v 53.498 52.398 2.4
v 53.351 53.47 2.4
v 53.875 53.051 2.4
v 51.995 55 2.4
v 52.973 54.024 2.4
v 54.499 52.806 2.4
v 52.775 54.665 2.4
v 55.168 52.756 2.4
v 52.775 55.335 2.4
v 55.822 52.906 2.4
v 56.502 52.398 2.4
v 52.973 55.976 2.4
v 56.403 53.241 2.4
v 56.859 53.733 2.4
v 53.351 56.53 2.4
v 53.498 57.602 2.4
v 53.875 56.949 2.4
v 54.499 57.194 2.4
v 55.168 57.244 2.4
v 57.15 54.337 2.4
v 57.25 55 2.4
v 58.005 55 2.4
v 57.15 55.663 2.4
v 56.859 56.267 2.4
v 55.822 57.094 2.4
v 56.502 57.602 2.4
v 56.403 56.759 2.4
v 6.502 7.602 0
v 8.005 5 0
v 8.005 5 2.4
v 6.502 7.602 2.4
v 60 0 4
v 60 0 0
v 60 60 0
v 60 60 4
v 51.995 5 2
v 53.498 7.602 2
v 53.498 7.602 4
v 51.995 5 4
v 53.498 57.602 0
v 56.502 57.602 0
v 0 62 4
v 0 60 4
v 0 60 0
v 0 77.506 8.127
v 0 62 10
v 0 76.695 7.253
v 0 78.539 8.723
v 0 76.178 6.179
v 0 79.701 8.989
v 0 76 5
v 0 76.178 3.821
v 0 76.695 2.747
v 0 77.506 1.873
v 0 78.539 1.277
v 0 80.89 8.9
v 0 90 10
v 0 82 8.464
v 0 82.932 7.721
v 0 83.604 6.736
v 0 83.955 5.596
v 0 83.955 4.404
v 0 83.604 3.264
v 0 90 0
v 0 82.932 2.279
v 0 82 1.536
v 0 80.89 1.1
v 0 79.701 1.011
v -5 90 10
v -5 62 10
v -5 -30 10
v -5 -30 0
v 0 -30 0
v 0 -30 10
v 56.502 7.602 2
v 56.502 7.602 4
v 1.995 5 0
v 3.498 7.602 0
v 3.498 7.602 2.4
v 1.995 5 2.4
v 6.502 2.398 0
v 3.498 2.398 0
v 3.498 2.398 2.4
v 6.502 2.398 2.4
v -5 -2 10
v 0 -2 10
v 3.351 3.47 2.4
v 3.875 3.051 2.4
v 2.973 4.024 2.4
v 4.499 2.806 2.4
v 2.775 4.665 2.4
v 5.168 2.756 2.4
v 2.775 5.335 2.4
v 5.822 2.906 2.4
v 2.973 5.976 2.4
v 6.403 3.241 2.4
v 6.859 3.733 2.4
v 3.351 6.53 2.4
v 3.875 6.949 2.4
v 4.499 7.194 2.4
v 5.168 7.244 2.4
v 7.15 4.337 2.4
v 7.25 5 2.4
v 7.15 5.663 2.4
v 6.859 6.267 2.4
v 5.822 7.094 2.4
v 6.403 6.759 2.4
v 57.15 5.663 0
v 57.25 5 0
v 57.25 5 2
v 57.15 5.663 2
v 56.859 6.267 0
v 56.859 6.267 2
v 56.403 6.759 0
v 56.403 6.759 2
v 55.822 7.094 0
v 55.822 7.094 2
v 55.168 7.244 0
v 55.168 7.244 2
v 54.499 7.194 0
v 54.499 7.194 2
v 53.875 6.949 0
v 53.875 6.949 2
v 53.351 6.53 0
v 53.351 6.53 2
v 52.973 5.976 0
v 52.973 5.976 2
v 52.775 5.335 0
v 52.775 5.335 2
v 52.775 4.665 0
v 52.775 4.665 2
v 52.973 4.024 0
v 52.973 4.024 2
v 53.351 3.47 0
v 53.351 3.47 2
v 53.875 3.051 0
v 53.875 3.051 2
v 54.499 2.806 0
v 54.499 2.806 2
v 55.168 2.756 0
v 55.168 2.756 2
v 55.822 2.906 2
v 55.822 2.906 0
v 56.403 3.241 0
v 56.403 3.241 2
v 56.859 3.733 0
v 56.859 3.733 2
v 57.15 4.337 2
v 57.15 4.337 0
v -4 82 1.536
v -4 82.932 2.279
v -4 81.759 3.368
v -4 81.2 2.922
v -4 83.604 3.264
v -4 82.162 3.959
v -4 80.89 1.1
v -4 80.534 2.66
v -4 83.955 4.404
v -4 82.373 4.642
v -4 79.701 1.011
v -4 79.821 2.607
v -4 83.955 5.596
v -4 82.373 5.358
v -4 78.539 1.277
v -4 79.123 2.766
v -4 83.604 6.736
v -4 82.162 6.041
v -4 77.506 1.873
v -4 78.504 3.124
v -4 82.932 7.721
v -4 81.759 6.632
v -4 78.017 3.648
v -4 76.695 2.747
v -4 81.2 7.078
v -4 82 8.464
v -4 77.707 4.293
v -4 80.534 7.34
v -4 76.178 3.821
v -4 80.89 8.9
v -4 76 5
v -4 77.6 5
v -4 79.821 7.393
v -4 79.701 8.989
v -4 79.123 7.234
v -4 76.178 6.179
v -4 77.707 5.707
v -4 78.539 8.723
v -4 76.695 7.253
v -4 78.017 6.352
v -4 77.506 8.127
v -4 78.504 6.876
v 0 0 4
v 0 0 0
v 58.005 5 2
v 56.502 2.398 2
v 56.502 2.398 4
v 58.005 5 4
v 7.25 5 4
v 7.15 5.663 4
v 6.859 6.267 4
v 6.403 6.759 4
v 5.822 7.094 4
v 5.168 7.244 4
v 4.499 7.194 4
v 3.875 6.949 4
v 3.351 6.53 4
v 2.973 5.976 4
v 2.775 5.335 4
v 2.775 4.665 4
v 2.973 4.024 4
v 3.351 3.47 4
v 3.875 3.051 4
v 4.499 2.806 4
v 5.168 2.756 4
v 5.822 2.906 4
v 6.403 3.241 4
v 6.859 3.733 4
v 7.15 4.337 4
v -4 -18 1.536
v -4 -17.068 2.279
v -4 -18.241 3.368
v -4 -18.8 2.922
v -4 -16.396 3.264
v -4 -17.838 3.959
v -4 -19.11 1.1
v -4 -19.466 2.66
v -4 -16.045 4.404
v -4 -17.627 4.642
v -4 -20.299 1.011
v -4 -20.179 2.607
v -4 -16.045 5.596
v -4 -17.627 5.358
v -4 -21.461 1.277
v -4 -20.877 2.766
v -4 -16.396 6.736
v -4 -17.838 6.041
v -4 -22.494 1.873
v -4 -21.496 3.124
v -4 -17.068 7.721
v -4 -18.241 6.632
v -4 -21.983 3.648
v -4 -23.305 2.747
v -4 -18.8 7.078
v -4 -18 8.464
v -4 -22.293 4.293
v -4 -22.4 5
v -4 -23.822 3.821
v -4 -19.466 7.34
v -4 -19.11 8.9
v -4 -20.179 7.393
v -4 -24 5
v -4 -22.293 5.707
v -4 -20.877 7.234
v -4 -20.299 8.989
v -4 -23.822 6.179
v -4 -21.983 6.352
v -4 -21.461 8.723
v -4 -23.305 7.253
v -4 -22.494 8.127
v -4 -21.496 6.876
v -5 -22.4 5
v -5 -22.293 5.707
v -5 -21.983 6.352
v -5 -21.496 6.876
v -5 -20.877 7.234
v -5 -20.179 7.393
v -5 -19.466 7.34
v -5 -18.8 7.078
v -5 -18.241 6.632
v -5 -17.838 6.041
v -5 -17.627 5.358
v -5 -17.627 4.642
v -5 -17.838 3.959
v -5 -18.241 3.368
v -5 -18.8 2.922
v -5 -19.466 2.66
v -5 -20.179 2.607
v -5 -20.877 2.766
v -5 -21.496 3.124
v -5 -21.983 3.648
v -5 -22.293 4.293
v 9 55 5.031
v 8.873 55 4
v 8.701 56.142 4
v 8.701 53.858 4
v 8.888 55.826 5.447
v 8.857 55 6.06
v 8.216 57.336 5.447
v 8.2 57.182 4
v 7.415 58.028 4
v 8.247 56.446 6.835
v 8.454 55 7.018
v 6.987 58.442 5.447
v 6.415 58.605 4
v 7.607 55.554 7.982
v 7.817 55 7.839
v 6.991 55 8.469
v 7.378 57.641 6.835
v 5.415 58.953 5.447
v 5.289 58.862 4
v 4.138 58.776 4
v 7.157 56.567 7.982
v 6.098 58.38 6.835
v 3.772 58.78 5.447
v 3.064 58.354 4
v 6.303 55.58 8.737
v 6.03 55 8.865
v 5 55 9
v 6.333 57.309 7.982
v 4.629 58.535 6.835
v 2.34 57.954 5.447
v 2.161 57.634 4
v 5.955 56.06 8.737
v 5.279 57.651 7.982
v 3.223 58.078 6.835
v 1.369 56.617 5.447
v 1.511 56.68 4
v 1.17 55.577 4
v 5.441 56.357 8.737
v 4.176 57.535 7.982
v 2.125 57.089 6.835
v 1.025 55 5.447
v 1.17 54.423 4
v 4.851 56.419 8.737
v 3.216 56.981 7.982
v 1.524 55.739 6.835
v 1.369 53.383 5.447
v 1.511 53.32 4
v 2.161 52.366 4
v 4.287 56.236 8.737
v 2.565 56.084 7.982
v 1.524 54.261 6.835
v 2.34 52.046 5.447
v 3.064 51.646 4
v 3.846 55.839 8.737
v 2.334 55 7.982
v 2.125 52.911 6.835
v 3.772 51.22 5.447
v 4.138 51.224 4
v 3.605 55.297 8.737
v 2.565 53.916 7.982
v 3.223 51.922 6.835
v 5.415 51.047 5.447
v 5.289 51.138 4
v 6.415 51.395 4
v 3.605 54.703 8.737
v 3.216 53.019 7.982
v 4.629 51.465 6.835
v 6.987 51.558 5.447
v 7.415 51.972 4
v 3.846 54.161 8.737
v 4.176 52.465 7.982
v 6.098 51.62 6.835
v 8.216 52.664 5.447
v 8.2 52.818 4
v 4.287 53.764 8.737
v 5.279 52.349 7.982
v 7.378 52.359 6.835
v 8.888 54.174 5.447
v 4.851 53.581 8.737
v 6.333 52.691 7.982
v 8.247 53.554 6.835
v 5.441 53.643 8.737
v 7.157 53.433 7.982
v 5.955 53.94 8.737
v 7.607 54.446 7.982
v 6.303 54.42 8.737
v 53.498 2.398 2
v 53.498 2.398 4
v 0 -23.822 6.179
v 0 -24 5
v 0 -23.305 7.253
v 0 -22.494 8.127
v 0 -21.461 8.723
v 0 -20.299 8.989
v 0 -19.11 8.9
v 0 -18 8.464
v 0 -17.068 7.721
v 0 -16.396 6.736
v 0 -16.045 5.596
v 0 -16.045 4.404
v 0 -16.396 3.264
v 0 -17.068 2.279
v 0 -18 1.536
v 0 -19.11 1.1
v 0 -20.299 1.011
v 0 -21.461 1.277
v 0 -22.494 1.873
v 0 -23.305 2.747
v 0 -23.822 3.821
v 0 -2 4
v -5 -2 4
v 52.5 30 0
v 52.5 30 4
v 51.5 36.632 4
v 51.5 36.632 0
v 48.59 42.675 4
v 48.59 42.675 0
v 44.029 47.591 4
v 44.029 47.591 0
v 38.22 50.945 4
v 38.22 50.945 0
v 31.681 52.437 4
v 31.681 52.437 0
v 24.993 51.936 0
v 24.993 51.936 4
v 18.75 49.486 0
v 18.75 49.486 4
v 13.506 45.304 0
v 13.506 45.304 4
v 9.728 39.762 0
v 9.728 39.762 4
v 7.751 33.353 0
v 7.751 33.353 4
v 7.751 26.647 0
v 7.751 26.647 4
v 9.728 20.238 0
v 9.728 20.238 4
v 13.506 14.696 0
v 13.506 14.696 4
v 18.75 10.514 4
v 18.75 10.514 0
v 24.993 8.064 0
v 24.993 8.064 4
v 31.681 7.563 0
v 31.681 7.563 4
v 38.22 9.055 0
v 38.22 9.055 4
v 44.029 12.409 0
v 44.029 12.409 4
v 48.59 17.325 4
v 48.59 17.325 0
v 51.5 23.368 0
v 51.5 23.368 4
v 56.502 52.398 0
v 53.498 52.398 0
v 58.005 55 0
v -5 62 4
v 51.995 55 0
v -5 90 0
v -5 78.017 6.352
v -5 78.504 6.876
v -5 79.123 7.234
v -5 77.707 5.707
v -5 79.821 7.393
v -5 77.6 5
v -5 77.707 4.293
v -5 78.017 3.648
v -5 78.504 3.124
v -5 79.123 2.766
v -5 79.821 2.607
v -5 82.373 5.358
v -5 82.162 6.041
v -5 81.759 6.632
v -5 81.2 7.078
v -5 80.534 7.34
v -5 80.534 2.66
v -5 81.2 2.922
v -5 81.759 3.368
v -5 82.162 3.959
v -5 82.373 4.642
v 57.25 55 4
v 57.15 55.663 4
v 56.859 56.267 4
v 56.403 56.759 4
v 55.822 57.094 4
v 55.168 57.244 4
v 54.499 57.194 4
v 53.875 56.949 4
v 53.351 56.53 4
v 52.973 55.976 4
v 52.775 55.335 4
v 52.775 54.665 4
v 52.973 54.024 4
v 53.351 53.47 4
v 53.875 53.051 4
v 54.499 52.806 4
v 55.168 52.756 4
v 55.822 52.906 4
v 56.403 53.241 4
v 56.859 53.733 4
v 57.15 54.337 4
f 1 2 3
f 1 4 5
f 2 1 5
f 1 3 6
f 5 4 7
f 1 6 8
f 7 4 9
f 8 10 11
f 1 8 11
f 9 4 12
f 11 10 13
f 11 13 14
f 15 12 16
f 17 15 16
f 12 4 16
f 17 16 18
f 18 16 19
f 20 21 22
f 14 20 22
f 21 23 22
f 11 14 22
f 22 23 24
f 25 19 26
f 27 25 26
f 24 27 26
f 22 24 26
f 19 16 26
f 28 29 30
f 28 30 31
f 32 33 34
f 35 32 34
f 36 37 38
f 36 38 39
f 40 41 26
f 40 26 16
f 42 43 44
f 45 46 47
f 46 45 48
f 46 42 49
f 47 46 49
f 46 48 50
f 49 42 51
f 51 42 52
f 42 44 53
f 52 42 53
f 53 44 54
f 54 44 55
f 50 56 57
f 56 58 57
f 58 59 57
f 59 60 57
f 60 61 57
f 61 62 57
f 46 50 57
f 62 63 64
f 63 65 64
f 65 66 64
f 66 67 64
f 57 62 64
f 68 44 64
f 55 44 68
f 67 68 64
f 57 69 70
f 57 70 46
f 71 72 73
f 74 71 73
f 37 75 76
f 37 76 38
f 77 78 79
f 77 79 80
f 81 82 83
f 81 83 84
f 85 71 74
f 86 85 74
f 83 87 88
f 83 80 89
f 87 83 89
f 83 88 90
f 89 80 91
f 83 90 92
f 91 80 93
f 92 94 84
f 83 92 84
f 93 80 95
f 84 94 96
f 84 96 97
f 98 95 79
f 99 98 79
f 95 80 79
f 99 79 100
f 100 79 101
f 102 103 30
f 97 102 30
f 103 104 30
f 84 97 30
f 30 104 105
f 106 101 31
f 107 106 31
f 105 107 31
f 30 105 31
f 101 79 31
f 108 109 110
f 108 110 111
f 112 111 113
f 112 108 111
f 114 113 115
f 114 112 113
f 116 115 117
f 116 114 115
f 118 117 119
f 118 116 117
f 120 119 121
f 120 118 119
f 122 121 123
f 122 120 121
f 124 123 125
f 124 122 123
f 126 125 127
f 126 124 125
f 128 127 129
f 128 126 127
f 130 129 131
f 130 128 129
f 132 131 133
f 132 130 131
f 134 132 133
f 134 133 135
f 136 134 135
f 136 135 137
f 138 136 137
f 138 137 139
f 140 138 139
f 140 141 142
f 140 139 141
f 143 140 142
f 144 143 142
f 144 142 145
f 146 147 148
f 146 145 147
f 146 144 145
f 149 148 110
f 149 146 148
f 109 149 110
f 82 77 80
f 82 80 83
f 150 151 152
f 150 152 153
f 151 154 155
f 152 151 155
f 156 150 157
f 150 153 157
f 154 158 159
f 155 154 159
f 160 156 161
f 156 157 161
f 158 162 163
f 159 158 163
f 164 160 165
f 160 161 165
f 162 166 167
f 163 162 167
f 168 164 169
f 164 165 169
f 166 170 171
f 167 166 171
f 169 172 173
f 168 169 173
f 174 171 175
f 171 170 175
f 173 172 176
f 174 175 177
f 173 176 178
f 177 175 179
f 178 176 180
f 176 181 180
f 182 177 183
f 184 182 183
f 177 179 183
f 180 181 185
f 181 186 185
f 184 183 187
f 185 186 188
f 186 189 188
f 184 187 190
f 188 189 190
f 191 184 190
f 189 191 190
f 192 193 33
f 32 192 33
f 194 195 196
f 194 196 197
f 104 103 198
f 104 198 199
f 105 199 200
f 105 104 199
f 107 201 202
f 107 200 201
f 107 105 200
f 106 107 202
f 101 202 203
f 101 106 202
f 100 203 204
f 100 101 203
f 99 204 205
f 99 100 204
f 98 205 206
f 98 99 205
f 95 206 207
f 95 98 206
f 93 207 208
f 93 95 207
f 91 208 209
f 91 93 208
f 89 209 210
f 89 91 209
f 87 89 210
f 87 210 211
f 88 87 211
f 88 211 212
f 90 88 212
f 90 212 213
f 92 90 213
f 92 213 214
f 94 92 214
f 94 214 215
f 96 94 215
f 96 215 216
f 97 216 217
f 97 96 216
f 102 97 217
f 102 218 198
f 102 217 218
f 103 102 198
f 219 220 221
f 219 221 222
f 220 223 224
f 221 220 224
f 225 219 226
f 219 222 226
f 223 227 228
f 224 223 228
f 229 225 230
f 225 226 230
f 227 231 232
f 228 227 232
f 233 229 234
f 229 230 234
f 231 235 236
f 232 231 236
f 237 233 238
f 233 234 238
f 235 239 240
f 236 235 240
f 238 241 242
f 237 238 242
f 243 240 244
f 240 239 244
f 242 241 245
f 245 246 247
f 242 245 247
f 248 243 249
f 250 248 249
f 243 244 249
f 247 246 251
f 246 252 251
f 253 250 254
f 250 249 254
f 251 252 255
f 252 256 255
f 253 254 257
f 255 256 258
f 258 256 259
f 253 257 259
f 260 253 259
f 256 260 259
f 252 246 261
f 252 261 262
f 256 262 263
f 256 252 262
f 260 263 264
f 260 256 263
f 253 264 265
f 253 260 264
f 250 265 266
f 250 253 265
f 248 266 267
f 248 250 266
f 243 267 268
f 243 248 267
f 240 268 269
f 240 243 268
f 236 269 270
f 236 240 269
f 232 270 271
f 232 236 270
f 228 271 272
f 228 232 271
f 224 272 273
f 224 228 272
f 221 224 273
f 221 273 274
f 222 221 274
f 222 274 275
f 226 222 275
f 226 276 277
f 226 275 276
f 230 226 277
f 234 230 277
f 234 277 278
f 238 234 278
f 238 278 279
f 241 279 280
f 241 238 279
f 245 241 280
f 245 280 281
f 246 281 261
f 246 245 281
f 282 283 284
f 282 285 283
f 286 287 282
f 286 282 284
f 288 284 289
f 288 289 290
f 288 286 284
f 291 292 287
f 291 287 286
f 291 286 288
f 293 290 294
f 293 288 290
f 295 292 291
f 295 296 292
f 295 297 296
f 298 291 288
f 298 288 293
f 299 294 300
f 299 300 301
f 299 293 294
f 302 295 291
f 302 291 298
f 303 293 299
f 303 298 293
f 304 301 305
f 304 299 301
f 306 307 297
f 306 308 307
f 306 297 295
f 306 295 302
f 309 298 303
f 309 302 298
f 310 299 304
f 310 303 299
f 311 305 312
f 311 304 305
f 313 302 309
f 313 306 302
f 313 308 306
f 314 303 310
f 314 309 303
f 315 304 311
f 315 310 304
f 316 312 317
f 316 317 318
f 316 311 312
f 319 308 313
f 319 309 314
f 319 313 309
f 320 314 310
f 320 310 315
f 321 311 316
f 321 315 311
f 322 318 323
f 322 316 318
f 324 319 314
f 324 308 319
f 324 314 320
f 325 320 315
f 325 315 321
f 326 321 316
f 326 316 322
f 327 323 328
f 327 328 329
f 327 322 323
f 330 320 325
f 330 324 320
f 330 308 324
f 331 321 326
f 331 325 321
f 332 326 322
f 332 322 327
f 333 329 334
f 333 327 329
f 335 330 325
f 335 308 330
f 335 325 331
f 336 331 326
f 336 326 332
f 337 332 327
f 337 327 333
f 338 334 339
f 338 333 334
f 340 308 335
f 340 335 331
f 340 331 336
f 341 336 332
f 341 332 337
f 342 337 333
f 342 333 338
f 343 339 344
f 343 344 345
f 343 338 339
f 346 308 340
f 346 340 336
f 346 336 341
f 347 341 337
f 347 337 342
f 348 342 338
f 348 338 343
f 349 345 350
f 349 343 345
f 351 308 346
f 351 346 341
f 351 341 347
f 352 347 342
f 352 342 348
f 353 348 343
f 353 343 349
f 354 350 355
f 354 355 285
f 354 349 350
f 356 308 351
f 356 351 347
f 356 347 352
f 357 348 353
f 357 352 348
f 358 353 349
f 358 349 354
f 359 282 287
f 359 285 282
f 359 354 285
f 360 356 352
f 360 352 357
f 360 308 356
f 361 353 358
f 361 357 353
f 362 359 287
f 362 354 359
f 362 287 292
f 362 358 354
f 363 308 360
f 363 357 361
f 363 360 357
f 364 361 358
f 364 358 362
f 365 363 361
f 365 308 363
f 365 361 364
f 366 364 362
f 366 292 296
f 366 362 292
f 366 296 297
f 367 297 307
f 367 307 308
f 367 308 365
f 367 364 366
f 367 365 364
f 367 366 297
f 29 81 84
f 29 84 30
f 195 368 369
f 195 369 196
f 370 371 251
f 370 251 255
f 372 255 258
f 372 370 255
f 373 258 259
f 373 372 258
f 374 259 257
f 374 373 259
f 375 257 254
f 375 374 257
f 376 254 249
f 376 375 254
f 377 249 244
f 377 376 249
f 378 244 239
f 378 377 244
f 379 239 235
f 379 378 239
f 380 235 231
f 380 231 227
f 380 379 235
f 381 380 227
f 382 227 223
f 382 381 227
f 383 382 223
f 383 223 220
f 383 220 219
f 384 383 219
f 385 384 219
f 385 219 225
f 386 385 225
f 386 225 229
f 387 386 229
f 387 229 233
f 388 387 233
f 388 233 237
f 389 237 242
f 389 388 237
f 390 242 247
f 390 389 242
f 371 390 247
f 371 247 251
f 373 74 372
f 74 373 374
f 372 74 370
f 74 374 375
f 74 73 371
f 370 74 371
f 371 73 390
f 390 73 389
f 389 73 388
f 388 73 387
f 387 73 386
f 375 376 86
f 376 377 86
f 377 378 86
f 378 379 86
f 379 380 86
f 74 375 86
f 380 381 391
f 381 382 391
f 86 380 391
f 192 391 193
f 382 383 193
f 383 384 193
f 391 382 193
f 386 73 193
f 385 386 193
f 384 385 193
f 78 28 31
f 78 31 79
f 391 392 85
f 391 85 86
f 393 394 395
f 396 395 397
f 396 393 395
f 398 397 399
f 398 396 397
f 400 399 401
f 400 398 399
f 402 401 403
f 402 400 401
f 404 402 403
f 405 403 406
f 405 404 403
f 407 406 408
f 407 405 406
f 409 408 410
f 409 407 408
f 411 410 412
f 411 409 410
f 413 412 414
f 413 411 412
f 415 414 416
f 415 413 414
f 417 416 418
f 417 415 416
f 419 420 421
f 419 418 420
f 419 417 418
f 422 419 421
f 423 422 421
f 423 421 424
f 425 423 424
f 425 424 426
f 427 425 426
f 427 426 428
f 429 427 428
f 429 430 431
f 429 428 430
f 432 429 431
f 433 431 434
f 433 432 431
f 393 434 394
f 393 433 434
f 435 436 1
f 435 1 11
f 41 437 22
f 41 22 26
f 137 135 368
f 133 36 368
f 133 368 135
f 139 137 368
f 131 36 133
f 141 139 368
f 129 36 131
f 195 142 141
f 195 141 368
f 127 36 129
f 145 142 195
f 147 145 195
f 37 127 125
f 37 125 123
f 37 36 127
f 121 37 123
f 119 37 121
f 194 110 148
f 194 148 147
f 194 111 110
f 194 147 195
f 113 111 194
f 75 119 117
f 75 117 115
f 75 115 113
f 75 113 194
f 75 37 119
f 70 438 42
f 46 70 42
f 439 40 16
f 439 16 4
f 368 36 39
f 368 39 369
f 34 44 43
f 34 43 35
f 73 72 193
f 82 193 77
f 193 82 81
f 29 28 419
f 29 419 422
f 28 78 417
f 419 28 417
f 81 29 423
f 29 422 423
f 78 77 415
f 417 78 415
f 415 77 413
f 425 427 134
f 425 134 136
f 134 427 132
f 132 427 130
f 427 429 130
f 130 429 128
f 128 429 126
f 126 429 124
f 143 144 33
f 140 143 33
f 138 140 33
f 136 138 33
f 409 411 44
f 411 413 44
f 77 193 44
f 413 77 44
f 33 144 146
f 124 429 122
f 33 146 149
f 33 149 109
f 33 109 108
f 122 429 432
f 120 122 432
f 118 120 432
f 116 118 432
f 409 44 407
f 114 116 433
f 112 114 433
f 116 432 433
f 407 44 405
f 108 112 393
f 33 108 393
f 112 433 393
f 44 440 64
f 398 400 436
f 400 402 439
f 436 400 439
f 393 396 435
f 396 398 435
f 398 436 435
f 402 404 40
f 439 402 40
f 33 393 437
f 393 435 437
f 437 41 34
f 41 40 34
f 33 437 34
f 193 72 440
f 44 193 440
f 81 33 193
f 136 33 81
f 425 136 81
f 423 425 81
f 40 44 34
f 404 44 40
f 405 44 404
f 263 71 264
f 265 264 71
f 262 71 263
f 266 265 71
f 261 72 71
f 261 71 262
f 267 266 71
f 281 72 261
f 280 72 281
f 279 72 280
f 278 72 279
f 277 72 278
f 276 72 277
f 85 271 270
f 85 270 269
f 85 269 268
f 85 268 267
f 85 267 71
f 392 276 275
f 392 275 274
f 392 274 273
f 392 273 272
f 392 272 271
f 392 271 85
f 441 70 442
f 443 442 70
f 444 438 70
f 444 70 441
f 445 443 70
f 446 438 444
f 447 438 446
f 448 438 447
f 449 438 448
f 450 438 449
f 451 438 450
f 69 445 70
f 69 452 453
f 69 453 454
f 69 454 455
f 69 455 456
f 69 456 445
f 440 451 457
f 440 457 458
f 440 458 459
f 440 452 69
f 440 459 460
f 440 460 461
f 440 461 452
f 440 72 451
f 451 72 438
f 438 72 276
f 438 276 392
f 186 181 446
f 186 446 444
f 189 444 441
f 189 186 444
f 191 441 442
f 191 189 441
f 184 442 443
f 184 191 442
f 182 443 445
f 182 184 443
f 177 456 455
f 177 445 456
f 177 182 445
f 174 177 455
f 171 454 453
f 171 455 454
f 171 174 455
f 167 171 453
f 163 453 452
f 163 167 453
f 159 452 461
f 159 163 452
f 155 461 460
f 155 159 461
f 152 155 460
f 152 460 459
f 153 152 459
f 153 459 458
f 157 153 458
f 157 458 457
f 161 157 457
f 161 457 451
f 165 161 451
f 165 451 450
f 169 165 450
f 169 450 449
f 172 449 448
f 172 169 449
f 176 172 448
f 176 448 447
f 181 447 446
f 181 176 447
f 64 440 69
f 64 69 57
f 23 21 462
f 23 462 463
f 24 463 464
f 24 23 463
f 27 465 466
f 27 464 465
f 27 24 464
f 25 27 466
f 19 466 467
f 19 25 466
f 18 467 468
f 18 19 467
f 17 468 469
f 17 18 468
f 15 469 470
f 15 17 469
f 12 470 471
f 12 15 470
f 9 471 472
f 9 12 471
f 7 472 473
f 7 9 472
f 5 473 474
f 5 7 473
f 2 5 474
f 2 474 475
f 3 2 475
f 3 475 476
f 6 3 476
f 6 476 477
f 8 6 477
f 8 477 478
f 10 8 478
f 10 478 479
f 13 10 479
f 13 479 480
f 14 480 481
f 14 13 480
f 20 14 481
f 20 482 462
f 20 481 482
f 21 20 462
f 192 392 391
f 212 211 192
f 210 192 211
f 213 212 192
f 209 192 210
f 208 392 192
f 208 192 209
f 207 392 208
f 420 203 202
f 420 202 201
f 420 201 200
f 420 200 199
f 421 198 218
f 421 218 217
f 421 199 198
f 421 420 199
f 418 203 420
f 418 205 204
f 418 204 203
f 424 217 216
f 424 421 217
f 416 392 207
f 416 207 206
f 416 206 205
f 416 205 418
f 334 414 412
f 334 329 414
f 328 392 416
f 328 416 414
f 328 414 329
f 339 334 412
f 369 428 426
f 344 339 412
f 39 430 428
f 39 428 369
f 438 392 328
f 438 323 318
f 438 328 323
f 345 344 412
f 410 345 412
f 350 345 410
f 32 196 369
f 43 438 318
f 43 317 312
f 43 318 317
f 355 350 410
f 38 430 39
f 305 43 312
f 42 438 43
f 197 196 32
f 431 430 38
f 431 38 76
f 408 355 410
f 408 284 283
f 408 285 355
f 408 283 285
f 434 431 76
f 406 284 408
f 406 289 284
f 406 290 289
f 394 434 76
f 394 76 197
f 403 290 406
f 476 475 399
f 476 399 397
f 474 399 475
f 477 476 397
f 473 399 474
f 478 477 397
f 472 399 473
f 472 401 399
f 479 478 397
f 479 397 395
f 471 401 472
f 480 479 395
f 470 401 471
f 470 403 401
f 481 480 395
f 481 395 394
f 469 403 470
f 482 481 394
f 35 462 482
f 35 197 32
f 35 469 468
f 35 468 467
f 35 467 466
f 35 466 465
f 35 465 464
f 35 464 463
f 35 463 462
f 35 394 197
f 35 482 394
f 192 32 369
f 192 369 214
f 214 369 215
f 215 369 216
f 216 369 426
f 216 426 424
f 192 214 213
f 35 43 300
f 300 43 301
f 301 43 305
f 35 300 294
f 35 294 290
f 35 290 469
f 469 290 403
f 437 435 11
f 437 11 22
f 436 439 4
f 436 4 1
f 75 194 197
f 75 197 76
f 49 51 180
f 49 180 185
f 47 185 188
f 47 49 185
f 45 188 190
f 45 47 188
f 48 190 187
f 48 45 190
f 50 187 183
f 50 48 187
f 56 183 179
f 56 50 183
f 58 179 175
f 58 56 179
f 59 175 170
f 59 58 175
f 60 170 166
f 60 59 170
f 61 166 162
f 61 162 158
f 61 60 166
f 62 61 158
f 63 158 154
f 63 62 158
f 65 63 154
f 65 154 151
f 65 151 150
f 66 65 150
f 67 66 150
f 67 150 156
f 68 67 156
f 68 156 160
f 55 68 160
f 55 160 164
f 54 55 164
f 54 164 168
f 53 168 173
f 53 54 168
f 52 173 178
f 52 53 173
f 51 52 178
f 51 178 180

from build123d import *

# Parameters (mm, degrees)
CYLINDER014_R             = 4
CYLINDER014_DEPTH         = 4
CYLINDER015_R             = 2.4
CYLINDER015_DEPTH         = 10
FUSION014_PLACEMENT_ANGLE = 90
CYLINDER016_R             = 4
CYLINDER016_DEPTH         = 4
CYLINDER017_R             = 2.4
CYLINDER017_DEPTH         = 10
FUSION015_PLACEMENT_ANGLE = 90
FUSION016_PLACEMENT_ANGLE = 270
BOX003_W                  = 5
BOX003_H                  = 64
BOX003_DEPTH              = 6
BOX002_W                  = 5
BOX002_H                  = 120
BOX002_DEPTH              = 10
CYLINDER021_R             = 22.5
CYLINDER021_DEPTH         = 10
CYLINDER018_R             = 2.25
CYLINDER018_DEPTH         = 10
EXTRUDE_DEPTH             = 2.4
CYLINDER019_R             = 2.25
CYLINDER019_DEPTH         = 10
CYLINDER020_R             = 2.25
CYLINDER020_DEPTH         = 10
BOX004_W                  = 60
BOX004_H                  = 60
BOX004_DEPTH              = 4


with BuildPart() as cylinder014:
    # Cylinder014 → Cylinder014 (new body)
    with BuildSketch(Plane.XY):
        Circle(CYLINDER014_R)
    extrude(amount=CYLINDER014_DEPTH)


with BuildPart() as fusion014:
    # Cylinder015 → Cylinder015 (new body)
    with BuildSketch(Plane.XY):
        Circle(CYLINDER015_R)
    extrude(amount=CYLINDER015_DEPTH)

    # Fusion014: union Cylinder014
    add(cylinder014.part)


with BuildPart() as fusion014_1:
    # Fusion014 placement: moved
    add(fusion014.part.moved(Location((-50, 0, 5))).rotate(Axis((-50, 0, 5), (1, 0, 0)), FUSION014_PLACEMENT_ANGLE))


with BuildPart() as cylinder016:
    # Cylinder016 → Cylinder016 (new body)
    with BuildSketch(Plane.XY):
        Circle(CYLINDER016_R)
    extrude(amount=CYLINDER016_DEPTH)


with BuildPart() as fusion016:
    # Cylinder017 → Cylinder017 (new body)
    with BuildSketch(Plane.XY):
        Circle(CYLINDER017_R)
    extrude(amount=CYLINDER017_DEPTH)

    # Fusion015: union Cylinder016
    add(cylinder016.part)


with BuildPart() as fusion016_1:
    # Fusion015 placement: moved
    add(fusion016.part.moved(Location((50, 0, 5))).rotate(Axis((50, 0, 5), (1, 0, 0)), FUSION015_PLACEMENT_ANGLE))

    # Fusion016: union Fusion014
    add(fusion014_1.part)


with BuildPart() as fusion016_2:
    # Fusion016 placement: moved
    add(fusion016_1.part.moved(Location((0, 30, 0))).rotate(Axis((0, 30, 0), (0, 0, 1)), FUSION016_PLACEMENT_ANGLE))


with BuildPart() as cube003:
    # Box003 → Box003 (new body)
    with BuildSketch(Plane(origin=(-5, -2, 4), x_dir=(1, 0, 0), z_dir=(0, 0, 1))):
        with Locations((2.5, 32)):
            Rectangle(BOX003_W, BOX003_H)
    extrude(amount=BOX003_DEPTH)


with BuildPart() as cut004:
    # Box002 → Box002 (new body)
    with BuildSketch(Plane(origin=(-5, -30, 0), x_dir=(1, 0, 0), z_dir=(0, 0, 1))):
        with Locations((2.5, 60)):
            Rectangle(BOX002_W, BOX002_H)
    extrude(amount=BOX002_DEPTH)

    # Cut003: cut Cube003
    add(cube003.part, mode=Mode.SUBTRACT)

    # Cut004: cut Fusion016
    add(fusion016_2.part, mode=Mode.SUBTRACT)


with BuildPart() as sphere001:
    # Sphere001 → Sphere001 (revolve)
    with BuildSketch(Plane(origin=(5, 55, 5), x_dir=(1, 0, 0), z_dir=(0, -1, 0))):
        with BuildLine():
            ThreePointArc((0, -4), (4, 0), (0, 4))
            Line((0, 4), (0, -4))
        make_face()
    revolve(axis=Axis((5, 55, 5), (0, 0, 1)))


with BuildPart() as cylinder021:
    # Cylinder021 → Cylinder021 (new body)
    with BuildSketch(Plane(origin=(30, 30, 0), x_dir=(1, 0, 0), z_dir=(0, 0, 1))):
        Circle(CYLINDER021_R)
    extrude(amount=CYLINDER021_DEPTH)


with BuildPart() as cylinder018:
    # Cylinder018 → Cylinder018 (new body)
    with BuildSketch(Plane(origin=(5, 5, 0), x_dir=(1, 0, 0), z_dir=(0, 0, 1))):
        Circle(CYLINDER018_R)
    extrude(amount=CYLINDER018_DEPTH)


with BuildPart() as din934_m007:
    # Sketch → Extrude (new body)
    with BuildSketch(Plane.XY):
        Polygon((-3.005, 0), (-1.5025, -2.602406), (1.5025, -2.602406), (3.005, 0), (1.5025, 2.602406), (-1.5025, 2.602406), align=None)
    extrude(amount=EXTRUDE_DEPTH)


with BuildPart() as fusion018:
    # Link004 base: copy of DIN934_M007
    add(din934_m007.part)


with BuildPart() as fusion018_1:
    # Link004 placement: moved
    add(fusion018.part.moved(Location((5, 5, 0))))

    # Fusion018: union Cylinder018
    add(cylinder018.part)


with BuildPart() as cylinder019:
    # Cylinder019 → Cylinder019 (new body)
    with BuildSketch(Plane(origin=(55, 5, -3), x_dir=(1, 0, 0), z_dir=(0, 0, 1))):
        Circle(CYLINDER019_R)
    extrude(amount=CYLINDER019_DEPTH)


with BuildPart() as fusion019:
    # Link005 base: copy of DIN934_M007
    add(din934_m007.part)


with BuildPart() as fusion019_1:
    # Link005 placement: moved
    add(fusion019.part.moved(Location((55, 5, 0))))

    # Fusion019: union Cylinder019
    add(cylinder019.part)


with BuildPart() as fusion019_2:
    # Fusion019 placement: moved
    add(fusion019_1.part.moved(Location((0, 0, 2))))


with BuildPart() as cylinder020:
    # Cylinder020 → Cylinder020 (new body)
    with BuildSketch(Plane(origin=(55, 55, 0), x_dir=(1, 0, 0), z_dir=(0, 0, 1))):
        Circle(CYLINDER020_R)
    extrude(amount=CYLINDER020_DEPTH)


with BuildPart() as compound002:
    # Link003 base: copy of DIN934_M007
    add(din934_m007.part)


with BuildPart() as compound002_1:
    # Link003 placement: moved
    add(compound002.part.moved(Location((55, 55, 0))))

    # Fusion017: union Cylinder020
    add(cylinder020.part)

    # Compound002: union Fusion018, Fusion019
    add(fusion018_1.part)
    add(fusion019_2.part)


with BuildPart() as kinematicmount_c35rails:
    # Box004 → Box004 (new body)
    with BuildSketch(Plane.XY):
        with Locations((30, 30)):
            Rectangle(BOX004_W, BOX004_H)
    extrude(amount=BOX004_DEPTH)

    # Cut005: cut Compound002
    add(compound002_1.part, mode=Mode.SUBTRACT)

    # Cut006: cut Cylinder021
    add(cylinder021.part, mode=Mode.SUBTRACT)

    # Fusion020: union Sphere001
    add(sphere001.part)

    # Fusion021: union Cut004
    add(cut004.part)


solid = kinematicmount_c35rails.part
